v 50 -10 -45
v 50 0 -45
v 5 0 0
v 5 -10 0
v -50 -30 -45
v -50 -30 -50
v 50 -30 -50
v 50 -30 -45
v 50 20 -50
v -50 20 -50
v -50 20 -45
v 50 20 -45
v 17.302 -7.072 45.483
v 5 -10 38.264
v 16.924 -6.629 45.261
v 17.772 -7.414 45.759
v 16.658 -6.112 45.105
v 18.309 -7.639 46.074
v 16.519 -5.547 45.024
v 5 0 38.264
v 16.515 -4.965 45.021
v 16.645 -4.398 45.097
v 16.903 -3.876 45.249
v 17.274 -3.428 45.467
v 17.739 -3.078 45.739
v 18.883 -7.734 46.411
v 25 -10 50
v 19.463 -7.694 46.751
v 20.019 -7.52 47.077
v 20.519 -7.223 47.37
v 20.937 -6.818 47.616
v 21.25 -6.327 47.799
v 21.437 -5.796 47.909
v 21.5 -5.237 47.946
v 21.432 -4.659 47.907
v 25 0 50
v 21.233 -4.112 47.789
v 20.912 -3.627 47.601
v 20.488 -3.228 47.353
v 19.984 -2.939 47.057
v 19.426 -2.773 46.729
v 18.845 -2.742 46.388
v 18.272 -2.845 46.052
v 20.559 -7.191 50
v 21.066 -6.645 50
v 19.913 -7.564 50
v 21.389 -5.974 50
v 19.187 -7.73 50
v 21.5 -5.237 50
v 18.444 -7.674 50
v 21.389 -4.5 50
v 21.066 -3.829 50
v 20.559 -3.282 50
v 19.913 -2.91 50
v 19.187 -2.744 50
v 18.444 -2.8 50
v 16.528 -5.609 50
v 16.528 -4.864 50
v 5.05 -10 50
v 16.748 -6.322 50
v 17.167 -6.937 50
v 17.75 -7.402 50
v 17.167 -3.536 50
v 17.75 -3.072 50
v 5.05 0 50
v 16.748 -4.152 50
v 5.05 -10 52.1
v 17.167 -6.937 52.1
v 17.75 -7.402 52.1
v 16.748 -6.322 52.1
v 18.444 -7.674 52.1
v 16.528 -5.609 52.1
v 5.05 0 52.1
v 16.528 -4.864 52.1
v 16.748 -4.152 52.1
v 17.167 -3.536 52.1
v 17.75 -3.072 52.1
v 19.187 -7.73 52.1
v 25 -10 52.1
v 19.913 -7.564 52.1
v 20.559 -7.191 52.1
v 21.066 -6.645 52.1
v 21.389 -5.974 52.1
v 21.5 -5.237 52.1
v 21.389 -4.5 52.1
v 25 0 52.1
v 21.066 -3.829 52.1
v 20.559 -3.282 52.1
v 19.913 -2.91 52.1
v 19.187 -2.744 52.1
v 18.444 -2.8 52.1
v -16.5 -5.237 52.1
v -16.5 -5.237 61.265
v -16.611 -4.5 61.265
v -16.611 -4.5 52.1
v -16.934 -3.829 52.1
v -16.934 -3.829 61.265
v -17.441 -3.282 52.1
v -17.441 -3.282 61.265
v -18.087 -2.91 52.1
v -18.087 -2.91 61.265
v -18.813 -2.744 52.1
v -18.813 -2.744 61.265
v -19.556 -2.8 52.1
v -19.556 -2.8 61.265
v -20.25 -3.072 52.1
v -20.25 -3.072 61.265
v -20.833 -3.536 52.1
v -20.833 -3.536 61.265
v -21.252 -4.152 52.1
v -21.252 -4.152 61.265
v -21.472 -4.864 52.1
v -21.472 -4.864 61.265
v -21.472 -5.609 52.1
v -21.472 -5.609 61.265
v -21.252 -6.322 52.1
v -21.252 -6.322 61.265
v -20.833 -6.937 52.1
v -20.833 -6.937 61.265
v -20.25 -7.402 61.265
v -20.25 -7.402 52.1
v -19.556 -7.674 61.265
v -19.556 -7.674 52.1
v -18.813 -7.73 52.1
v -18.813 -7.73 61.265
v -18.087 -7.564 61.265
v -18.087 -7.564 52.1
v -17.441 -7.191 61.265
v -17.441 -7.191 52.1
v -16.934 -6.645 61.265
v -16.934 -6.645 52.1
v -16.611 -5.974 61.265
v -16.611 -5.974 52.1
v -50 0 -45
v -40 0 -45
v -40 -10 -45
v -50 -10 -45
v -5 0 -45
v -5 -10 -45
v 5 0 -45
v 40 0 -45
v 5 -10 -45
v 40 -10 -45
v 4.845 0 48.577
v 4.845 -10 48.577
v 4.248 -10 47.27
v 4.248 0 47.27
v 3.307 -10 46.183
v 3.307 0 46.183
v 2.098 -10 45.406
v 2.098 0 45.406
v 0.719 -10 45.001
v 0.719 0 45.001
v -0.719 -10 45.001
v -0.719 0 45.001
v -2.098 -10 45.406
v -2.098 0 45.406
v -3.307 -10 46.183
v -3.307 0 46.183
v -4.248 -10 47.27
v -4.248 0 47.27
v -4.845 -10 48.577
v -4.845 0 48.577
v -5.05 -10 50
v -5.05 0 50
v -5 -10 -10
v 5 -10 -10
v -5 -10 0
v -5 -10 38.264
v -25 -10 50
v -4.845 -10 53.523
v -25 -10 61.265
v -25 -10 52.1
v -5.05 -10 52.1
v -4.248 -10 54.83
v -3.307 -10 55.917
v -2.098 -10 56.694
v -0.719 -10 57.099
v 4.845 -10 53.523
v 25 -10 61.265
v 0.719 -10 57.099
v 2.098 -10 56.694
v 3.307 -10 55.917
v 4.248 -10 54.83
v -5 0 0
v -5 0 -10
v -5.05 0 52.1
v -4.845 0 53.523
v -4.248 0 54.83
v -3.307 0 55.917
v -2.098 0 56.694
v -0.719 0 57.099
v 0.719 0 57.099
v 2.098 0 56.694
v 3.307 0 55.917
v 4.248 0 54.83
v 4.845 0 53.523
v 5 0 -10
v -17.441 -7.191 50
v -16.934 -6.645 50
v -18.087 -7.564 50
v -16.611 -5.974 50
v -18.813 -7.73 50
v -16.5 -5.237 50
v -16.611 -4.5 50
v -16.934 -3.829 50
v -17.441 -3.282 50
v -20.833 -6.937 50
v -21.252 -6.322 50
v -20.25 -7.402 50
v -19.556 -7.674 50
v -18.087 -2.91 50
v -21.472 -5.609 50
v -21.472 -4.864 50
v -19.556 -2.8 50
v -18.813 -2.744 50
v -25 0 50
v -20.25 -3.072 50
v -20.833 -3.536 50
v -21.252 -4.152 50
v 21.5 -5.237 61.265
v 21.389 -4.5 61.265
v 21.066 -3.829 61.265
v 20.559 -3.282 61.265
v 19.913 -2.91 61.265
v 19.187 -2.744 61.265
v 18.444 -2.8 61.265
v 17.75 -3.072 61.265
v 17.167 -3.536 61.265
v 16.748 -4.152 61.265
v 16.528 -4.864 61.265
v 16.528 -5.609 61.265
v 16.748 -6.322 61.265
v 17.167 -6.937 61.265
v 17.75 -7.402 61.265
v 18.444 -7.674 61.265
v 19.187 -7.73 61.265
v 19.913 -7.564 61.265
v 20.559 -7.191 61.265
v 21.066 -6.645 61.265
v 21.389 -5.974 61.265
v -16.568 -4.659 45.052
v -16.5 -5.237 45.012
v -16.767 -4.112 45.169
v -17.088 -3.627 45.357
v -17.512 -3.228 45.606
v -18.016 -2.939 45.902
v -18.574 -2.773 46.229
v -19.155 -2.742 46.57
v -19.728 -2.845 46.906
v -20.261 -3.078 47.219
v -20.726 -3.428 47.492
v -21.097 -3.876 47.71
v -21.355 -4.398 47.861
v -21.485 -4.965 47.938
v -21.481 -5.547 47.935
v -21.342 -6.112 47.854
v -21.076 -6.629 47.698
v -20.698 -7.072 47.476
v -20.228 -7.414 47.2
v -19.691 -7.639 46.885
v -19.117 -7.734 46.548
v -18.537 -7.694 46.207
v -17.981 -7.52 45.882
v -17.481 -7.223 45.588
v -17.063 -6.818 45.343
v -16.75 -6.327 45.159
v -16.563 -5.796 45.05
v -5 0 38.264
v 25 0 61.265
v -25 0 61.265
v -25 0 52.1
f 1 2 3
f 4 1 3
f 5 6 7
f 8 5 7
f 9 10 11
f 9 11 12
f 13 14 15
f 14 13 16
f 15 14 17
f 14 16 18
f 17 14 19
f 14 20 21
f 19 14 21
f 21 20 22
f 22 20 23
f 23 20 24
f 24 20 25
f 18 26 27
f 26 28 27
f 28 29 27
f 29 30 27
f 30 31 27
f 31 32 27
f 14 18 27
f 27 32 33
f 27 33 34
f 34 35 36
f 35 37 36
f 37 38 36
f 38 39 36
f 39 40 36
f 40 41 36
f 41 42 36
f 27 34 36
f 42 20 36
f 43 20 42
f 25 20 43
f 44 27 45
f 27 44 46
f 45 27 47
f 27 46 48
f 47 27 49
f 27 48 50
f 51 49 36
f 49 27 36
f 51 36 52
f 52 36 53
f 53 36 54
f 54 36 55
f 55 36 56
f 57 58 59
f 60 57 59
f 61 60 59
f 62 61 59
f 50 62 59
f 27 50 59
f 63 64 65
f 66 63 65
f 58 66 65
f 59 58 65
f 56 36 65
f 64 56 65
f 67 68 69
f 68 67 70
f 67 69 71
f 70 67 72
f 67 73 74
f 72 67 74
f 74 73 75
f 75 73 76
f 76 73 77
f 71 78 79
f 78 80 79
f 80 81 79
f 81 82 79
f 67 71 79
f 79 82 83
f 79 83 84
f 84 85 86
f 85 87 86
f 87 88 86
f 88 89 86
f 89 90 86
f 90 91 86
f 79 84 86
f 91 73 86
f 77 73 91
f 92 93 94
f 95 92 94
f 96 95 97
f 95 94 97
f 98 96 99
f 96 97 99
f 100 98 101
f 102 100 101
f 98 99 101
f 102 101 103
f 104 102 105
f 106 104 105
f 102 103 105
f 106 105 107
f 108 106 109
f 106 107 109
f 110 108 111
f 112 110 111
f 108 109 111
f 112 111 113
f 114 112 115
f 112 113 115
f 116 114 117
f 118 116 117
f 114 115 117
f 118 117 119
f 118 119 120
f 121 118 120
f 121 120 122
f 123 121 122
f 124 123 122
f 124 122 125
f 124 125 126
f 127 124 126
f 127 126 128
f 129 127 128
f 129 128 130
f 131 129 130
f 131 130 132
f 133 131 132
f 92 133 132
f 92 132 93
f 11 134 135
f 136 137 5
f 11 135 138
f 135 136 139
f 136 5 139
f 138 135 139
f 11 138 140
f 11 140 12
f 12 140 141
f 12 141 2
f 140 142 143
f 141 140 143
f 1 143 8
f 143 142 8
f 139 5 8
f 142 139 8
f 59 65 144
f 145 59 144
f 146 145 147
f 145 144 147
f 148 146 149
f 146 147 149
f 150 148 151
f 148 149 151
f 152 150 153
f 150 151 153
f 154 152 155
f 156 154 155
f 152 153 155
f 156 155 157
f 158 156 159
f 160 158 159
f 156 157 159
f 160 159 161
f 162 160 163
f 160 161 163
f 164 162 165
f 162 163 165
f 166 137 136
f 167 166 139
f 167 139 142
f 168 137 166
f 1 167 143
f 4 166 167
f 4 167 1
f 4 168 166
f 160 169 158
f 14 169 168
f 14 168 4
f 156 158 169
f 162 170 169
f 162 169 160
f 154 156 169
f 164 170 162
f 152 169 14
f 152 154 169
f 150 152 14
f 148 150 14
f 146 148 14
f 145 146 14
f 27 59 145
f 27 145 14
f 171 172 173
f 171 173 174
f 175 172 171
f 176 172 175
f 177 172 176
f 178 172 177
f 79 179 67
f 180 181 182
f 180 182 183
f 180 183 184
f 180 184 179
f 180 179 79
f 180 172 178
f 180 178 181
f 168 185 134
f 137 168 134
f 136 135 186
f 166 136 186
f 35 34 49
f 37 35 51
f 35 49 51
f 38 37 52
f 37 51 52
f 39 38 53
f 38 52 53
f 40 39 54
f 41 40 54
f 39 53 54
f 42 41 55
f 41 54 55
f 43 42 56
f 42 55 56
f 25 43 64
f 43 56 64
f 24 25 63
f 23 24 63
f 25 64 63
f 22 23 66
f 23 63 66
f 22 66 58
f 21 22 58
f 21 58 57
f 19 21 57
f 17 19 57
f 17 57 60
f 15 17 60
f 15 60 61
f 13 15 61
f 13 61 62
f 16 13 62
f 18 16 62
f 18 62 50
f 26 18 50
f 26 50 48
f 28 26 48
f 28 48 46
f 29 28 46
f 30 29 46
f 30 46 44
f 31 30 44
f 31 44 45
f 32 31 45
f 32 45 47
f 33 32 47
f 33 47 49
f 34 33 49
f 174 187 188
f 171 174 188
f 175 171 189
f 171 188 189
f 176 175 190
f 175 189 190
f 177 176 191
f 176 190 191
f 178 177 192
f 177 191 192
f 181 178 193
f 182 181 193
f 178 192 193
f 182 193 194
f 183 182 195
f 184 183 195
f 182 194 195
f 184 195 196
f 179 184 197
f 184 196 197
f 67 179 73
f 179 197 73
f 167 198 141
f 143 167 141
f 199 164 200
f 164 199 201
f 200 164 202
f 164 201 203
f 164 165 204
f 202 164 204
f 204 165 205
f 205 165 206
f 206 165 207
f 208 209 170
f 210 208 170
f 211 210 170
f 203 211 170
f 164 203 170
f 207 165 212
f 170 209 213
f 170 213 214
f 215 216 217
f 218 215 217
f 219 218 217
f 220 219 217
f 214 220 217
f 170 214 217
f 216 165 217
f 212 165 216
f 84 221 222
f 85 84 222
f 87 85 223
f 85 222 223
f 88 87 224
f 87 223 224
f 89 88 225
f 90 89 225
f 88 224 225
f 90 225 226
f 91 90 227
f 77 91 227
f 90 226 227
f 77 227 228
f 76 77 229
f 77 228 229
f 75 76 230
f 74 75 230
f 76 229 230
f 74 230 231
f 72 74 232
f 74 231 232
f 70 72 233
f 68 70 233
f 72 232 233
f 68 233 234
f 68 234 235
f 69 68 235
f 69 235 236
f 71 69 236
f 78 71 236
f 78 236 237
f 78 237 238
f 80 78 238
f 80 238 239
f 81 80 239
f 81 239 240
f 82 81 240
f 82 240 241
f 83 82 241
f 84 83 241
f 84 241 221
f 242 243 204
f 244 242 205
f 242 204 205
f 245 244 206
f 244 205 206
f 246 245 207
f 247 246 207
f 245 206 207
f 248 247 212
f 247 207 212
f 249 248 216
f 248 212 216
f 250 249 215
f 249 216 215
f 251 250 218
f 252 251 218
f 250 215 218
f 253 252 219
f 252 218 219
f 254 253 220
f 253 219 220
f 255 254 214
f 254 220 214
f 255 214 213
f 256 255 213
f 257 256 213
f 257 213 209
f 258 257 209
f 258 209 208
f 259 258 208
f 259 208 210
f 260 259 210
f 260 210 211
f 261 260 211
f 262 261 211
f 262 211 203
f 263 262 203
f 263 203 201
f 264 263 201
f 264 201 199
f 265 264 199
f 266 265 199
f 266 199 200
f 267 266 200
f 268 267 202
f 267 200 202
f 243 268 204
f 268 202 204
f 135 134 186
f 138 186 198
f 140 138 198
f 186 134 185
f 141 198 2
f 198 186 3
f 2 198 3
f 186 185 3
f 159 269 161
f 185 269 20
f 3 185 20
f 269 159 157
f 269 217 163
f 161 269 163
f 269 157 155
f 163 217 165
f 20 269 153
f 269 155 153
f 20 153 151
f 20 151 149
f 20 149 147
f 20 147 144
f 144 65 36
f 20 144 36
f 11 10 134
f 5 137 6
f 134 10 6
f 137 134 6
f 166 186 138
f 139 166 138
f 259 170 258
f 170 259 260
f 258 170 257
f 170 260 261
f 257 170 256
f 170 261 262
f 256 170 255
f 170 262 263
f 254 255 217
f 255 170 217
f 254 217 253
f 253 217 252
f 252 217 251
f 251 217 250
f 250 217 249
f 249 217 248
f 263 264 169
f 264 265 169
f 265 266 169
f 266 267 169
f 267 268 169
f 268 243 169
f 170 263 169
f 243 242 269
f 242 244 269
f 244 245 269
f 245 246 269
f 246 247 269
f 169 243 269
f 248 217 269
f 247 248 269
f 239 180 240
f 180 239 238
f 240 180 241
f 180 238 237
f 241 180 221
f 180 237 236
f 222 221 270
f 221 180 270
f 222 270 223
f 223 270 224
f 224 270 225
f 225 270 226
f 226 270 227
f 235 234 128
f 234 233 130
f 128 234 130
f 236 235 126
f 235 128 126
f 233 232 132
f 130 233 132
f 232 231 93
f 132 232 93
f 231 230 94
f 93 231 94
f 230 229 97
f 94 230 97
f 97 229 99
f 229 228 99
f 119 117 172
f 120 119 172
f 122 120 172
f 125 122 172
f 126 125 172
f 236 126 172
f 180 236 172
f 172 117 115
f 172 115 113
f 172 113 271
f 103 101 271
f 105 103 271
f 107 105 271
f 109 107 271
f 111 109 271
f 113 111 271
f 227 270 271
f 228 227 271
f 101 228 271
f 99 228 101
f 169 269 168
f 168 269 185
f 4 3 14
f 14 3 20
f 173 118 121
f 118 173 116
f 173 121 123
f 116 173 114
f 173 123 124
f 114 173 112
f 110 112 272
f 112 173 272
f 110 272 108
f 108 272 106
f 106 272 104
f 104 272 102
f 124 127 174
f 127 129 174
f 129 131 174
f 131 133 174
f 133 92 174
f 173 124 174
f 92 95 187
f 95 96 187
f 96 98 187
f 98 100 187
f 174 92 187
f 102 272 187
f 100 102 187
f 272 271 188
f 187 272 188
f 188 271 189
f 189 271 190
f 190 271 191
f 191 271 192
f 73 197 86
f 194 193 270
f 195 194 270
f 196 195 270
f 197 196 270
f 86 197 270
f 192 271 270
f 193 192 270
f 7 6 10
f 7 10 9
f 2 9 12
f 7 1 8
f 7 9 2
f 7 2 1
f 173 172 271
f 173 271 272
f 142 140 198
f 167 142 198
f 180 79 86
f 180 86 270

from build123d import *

# Parameters (mm, degrees)
F1_DEPTH = 10
F3_R     = 2.5
F4_DEPTH = 25
F5_W     = 100
F5_H     = 20
F6_DEPTH = 5


# Not quite as in the source:
# - a feature names something its author has since deleted; it is built from what else it names


with BuildPart() as f1:
    # F0 (on Front) → F1 (new body)
    with BuildSketch(Plane.XZ):
        with BuildLine():
            Line((-5.05, 50), (-25, 50))
            Line((-25, 50), (-5, 38.2643528283))
            Line((-5, 38.2643528283), (-5, 0))
            Line((-5, 0), (-50, -45))
            Line((-50, -45), (-50, -50))
            Line((-50, -50), (50, -50))
            Line((50, -50), (50, -45))
            Line((50, -45), (5, 0))
            Line((5, 0), (5, 38.2643528283))
            Line((5, 38.2643528283), (25, 50))
            Line((25, 50), (5.05, 50))
            ThreePointArc((5.05, 50), (0, 44.95), (-5.05, 50))
        make_face()
        Polygon((-5, -45), (-40, -45), (-5, -10), align=None, mode=Mode.SUBTRACT)
        Polygon((5, -10), (40, -45), (5, -45), align=None, mode=Mode.SUBTRACT)
    extrude(amount=F1_DEPTH)


with BuildPart() as f1b:
    # F0 (on Front) → F1, piece 2 (new body)
    with BuildSketch(Plane.XZ):
        with BuildLine():
            Line((5.05, 52.1000094712), (25, 52.1000094712))
            Line((25, 52.1000094712), (25, 61.2651444972))
            Line((25, 61.2651444972), (-25, 61.2651444972))
            Line((-25, 61.2651444972), (-25, 52.1000094712))
            Line((-25, 52.1000094712), (-5.05, 52.1000094712))
            ThreePointArc((-5.05, 52.1000094712), (0, 57.1500094712), (5.05, 52.1000094712))
        make_face()
    extrude(amount=F1_DEPTH)


with BuildPart() as f4_tool:
    # F3 (on offset) → F4 (new body)
    with BuildSketch(Plane.XY.offset(61.5)):
        with Locations((-19, -5.2368245088)):
            Circle(F3_R)
        with Locations((19, -5.2368245088)):
            Circle(F3_R)
    extrude(amount=-F4_DEPTH)


with BuildPart() as f1_1:
    add(f1.part)

    # F4: cut by f4_tool
    add(f4_tool.part, mode=Mode.SUBTRACT)

    # F5 (on face) → F6 (join)
    with BuildSketch(Plane(origin=(0, 0, -50), x_dir=(1, 0, 0), z_dir=(0, 0, -1))):
        with Locations((0, -10)):
            Rectangle(F5_W, F5_H)
        with Locations((0, 20)):
            Rectangle(F5_W, F5_H)
    extrude(amount=-F6_DEPTH)


with BuildPart() as f1b_1:
    add(f1b.part)

    # F4: cut by f4_tool
    add(f4_tool.part, mode=Mode.SUBTRACT)


solid = Compound([f1_1.part, f1b_1.part])
